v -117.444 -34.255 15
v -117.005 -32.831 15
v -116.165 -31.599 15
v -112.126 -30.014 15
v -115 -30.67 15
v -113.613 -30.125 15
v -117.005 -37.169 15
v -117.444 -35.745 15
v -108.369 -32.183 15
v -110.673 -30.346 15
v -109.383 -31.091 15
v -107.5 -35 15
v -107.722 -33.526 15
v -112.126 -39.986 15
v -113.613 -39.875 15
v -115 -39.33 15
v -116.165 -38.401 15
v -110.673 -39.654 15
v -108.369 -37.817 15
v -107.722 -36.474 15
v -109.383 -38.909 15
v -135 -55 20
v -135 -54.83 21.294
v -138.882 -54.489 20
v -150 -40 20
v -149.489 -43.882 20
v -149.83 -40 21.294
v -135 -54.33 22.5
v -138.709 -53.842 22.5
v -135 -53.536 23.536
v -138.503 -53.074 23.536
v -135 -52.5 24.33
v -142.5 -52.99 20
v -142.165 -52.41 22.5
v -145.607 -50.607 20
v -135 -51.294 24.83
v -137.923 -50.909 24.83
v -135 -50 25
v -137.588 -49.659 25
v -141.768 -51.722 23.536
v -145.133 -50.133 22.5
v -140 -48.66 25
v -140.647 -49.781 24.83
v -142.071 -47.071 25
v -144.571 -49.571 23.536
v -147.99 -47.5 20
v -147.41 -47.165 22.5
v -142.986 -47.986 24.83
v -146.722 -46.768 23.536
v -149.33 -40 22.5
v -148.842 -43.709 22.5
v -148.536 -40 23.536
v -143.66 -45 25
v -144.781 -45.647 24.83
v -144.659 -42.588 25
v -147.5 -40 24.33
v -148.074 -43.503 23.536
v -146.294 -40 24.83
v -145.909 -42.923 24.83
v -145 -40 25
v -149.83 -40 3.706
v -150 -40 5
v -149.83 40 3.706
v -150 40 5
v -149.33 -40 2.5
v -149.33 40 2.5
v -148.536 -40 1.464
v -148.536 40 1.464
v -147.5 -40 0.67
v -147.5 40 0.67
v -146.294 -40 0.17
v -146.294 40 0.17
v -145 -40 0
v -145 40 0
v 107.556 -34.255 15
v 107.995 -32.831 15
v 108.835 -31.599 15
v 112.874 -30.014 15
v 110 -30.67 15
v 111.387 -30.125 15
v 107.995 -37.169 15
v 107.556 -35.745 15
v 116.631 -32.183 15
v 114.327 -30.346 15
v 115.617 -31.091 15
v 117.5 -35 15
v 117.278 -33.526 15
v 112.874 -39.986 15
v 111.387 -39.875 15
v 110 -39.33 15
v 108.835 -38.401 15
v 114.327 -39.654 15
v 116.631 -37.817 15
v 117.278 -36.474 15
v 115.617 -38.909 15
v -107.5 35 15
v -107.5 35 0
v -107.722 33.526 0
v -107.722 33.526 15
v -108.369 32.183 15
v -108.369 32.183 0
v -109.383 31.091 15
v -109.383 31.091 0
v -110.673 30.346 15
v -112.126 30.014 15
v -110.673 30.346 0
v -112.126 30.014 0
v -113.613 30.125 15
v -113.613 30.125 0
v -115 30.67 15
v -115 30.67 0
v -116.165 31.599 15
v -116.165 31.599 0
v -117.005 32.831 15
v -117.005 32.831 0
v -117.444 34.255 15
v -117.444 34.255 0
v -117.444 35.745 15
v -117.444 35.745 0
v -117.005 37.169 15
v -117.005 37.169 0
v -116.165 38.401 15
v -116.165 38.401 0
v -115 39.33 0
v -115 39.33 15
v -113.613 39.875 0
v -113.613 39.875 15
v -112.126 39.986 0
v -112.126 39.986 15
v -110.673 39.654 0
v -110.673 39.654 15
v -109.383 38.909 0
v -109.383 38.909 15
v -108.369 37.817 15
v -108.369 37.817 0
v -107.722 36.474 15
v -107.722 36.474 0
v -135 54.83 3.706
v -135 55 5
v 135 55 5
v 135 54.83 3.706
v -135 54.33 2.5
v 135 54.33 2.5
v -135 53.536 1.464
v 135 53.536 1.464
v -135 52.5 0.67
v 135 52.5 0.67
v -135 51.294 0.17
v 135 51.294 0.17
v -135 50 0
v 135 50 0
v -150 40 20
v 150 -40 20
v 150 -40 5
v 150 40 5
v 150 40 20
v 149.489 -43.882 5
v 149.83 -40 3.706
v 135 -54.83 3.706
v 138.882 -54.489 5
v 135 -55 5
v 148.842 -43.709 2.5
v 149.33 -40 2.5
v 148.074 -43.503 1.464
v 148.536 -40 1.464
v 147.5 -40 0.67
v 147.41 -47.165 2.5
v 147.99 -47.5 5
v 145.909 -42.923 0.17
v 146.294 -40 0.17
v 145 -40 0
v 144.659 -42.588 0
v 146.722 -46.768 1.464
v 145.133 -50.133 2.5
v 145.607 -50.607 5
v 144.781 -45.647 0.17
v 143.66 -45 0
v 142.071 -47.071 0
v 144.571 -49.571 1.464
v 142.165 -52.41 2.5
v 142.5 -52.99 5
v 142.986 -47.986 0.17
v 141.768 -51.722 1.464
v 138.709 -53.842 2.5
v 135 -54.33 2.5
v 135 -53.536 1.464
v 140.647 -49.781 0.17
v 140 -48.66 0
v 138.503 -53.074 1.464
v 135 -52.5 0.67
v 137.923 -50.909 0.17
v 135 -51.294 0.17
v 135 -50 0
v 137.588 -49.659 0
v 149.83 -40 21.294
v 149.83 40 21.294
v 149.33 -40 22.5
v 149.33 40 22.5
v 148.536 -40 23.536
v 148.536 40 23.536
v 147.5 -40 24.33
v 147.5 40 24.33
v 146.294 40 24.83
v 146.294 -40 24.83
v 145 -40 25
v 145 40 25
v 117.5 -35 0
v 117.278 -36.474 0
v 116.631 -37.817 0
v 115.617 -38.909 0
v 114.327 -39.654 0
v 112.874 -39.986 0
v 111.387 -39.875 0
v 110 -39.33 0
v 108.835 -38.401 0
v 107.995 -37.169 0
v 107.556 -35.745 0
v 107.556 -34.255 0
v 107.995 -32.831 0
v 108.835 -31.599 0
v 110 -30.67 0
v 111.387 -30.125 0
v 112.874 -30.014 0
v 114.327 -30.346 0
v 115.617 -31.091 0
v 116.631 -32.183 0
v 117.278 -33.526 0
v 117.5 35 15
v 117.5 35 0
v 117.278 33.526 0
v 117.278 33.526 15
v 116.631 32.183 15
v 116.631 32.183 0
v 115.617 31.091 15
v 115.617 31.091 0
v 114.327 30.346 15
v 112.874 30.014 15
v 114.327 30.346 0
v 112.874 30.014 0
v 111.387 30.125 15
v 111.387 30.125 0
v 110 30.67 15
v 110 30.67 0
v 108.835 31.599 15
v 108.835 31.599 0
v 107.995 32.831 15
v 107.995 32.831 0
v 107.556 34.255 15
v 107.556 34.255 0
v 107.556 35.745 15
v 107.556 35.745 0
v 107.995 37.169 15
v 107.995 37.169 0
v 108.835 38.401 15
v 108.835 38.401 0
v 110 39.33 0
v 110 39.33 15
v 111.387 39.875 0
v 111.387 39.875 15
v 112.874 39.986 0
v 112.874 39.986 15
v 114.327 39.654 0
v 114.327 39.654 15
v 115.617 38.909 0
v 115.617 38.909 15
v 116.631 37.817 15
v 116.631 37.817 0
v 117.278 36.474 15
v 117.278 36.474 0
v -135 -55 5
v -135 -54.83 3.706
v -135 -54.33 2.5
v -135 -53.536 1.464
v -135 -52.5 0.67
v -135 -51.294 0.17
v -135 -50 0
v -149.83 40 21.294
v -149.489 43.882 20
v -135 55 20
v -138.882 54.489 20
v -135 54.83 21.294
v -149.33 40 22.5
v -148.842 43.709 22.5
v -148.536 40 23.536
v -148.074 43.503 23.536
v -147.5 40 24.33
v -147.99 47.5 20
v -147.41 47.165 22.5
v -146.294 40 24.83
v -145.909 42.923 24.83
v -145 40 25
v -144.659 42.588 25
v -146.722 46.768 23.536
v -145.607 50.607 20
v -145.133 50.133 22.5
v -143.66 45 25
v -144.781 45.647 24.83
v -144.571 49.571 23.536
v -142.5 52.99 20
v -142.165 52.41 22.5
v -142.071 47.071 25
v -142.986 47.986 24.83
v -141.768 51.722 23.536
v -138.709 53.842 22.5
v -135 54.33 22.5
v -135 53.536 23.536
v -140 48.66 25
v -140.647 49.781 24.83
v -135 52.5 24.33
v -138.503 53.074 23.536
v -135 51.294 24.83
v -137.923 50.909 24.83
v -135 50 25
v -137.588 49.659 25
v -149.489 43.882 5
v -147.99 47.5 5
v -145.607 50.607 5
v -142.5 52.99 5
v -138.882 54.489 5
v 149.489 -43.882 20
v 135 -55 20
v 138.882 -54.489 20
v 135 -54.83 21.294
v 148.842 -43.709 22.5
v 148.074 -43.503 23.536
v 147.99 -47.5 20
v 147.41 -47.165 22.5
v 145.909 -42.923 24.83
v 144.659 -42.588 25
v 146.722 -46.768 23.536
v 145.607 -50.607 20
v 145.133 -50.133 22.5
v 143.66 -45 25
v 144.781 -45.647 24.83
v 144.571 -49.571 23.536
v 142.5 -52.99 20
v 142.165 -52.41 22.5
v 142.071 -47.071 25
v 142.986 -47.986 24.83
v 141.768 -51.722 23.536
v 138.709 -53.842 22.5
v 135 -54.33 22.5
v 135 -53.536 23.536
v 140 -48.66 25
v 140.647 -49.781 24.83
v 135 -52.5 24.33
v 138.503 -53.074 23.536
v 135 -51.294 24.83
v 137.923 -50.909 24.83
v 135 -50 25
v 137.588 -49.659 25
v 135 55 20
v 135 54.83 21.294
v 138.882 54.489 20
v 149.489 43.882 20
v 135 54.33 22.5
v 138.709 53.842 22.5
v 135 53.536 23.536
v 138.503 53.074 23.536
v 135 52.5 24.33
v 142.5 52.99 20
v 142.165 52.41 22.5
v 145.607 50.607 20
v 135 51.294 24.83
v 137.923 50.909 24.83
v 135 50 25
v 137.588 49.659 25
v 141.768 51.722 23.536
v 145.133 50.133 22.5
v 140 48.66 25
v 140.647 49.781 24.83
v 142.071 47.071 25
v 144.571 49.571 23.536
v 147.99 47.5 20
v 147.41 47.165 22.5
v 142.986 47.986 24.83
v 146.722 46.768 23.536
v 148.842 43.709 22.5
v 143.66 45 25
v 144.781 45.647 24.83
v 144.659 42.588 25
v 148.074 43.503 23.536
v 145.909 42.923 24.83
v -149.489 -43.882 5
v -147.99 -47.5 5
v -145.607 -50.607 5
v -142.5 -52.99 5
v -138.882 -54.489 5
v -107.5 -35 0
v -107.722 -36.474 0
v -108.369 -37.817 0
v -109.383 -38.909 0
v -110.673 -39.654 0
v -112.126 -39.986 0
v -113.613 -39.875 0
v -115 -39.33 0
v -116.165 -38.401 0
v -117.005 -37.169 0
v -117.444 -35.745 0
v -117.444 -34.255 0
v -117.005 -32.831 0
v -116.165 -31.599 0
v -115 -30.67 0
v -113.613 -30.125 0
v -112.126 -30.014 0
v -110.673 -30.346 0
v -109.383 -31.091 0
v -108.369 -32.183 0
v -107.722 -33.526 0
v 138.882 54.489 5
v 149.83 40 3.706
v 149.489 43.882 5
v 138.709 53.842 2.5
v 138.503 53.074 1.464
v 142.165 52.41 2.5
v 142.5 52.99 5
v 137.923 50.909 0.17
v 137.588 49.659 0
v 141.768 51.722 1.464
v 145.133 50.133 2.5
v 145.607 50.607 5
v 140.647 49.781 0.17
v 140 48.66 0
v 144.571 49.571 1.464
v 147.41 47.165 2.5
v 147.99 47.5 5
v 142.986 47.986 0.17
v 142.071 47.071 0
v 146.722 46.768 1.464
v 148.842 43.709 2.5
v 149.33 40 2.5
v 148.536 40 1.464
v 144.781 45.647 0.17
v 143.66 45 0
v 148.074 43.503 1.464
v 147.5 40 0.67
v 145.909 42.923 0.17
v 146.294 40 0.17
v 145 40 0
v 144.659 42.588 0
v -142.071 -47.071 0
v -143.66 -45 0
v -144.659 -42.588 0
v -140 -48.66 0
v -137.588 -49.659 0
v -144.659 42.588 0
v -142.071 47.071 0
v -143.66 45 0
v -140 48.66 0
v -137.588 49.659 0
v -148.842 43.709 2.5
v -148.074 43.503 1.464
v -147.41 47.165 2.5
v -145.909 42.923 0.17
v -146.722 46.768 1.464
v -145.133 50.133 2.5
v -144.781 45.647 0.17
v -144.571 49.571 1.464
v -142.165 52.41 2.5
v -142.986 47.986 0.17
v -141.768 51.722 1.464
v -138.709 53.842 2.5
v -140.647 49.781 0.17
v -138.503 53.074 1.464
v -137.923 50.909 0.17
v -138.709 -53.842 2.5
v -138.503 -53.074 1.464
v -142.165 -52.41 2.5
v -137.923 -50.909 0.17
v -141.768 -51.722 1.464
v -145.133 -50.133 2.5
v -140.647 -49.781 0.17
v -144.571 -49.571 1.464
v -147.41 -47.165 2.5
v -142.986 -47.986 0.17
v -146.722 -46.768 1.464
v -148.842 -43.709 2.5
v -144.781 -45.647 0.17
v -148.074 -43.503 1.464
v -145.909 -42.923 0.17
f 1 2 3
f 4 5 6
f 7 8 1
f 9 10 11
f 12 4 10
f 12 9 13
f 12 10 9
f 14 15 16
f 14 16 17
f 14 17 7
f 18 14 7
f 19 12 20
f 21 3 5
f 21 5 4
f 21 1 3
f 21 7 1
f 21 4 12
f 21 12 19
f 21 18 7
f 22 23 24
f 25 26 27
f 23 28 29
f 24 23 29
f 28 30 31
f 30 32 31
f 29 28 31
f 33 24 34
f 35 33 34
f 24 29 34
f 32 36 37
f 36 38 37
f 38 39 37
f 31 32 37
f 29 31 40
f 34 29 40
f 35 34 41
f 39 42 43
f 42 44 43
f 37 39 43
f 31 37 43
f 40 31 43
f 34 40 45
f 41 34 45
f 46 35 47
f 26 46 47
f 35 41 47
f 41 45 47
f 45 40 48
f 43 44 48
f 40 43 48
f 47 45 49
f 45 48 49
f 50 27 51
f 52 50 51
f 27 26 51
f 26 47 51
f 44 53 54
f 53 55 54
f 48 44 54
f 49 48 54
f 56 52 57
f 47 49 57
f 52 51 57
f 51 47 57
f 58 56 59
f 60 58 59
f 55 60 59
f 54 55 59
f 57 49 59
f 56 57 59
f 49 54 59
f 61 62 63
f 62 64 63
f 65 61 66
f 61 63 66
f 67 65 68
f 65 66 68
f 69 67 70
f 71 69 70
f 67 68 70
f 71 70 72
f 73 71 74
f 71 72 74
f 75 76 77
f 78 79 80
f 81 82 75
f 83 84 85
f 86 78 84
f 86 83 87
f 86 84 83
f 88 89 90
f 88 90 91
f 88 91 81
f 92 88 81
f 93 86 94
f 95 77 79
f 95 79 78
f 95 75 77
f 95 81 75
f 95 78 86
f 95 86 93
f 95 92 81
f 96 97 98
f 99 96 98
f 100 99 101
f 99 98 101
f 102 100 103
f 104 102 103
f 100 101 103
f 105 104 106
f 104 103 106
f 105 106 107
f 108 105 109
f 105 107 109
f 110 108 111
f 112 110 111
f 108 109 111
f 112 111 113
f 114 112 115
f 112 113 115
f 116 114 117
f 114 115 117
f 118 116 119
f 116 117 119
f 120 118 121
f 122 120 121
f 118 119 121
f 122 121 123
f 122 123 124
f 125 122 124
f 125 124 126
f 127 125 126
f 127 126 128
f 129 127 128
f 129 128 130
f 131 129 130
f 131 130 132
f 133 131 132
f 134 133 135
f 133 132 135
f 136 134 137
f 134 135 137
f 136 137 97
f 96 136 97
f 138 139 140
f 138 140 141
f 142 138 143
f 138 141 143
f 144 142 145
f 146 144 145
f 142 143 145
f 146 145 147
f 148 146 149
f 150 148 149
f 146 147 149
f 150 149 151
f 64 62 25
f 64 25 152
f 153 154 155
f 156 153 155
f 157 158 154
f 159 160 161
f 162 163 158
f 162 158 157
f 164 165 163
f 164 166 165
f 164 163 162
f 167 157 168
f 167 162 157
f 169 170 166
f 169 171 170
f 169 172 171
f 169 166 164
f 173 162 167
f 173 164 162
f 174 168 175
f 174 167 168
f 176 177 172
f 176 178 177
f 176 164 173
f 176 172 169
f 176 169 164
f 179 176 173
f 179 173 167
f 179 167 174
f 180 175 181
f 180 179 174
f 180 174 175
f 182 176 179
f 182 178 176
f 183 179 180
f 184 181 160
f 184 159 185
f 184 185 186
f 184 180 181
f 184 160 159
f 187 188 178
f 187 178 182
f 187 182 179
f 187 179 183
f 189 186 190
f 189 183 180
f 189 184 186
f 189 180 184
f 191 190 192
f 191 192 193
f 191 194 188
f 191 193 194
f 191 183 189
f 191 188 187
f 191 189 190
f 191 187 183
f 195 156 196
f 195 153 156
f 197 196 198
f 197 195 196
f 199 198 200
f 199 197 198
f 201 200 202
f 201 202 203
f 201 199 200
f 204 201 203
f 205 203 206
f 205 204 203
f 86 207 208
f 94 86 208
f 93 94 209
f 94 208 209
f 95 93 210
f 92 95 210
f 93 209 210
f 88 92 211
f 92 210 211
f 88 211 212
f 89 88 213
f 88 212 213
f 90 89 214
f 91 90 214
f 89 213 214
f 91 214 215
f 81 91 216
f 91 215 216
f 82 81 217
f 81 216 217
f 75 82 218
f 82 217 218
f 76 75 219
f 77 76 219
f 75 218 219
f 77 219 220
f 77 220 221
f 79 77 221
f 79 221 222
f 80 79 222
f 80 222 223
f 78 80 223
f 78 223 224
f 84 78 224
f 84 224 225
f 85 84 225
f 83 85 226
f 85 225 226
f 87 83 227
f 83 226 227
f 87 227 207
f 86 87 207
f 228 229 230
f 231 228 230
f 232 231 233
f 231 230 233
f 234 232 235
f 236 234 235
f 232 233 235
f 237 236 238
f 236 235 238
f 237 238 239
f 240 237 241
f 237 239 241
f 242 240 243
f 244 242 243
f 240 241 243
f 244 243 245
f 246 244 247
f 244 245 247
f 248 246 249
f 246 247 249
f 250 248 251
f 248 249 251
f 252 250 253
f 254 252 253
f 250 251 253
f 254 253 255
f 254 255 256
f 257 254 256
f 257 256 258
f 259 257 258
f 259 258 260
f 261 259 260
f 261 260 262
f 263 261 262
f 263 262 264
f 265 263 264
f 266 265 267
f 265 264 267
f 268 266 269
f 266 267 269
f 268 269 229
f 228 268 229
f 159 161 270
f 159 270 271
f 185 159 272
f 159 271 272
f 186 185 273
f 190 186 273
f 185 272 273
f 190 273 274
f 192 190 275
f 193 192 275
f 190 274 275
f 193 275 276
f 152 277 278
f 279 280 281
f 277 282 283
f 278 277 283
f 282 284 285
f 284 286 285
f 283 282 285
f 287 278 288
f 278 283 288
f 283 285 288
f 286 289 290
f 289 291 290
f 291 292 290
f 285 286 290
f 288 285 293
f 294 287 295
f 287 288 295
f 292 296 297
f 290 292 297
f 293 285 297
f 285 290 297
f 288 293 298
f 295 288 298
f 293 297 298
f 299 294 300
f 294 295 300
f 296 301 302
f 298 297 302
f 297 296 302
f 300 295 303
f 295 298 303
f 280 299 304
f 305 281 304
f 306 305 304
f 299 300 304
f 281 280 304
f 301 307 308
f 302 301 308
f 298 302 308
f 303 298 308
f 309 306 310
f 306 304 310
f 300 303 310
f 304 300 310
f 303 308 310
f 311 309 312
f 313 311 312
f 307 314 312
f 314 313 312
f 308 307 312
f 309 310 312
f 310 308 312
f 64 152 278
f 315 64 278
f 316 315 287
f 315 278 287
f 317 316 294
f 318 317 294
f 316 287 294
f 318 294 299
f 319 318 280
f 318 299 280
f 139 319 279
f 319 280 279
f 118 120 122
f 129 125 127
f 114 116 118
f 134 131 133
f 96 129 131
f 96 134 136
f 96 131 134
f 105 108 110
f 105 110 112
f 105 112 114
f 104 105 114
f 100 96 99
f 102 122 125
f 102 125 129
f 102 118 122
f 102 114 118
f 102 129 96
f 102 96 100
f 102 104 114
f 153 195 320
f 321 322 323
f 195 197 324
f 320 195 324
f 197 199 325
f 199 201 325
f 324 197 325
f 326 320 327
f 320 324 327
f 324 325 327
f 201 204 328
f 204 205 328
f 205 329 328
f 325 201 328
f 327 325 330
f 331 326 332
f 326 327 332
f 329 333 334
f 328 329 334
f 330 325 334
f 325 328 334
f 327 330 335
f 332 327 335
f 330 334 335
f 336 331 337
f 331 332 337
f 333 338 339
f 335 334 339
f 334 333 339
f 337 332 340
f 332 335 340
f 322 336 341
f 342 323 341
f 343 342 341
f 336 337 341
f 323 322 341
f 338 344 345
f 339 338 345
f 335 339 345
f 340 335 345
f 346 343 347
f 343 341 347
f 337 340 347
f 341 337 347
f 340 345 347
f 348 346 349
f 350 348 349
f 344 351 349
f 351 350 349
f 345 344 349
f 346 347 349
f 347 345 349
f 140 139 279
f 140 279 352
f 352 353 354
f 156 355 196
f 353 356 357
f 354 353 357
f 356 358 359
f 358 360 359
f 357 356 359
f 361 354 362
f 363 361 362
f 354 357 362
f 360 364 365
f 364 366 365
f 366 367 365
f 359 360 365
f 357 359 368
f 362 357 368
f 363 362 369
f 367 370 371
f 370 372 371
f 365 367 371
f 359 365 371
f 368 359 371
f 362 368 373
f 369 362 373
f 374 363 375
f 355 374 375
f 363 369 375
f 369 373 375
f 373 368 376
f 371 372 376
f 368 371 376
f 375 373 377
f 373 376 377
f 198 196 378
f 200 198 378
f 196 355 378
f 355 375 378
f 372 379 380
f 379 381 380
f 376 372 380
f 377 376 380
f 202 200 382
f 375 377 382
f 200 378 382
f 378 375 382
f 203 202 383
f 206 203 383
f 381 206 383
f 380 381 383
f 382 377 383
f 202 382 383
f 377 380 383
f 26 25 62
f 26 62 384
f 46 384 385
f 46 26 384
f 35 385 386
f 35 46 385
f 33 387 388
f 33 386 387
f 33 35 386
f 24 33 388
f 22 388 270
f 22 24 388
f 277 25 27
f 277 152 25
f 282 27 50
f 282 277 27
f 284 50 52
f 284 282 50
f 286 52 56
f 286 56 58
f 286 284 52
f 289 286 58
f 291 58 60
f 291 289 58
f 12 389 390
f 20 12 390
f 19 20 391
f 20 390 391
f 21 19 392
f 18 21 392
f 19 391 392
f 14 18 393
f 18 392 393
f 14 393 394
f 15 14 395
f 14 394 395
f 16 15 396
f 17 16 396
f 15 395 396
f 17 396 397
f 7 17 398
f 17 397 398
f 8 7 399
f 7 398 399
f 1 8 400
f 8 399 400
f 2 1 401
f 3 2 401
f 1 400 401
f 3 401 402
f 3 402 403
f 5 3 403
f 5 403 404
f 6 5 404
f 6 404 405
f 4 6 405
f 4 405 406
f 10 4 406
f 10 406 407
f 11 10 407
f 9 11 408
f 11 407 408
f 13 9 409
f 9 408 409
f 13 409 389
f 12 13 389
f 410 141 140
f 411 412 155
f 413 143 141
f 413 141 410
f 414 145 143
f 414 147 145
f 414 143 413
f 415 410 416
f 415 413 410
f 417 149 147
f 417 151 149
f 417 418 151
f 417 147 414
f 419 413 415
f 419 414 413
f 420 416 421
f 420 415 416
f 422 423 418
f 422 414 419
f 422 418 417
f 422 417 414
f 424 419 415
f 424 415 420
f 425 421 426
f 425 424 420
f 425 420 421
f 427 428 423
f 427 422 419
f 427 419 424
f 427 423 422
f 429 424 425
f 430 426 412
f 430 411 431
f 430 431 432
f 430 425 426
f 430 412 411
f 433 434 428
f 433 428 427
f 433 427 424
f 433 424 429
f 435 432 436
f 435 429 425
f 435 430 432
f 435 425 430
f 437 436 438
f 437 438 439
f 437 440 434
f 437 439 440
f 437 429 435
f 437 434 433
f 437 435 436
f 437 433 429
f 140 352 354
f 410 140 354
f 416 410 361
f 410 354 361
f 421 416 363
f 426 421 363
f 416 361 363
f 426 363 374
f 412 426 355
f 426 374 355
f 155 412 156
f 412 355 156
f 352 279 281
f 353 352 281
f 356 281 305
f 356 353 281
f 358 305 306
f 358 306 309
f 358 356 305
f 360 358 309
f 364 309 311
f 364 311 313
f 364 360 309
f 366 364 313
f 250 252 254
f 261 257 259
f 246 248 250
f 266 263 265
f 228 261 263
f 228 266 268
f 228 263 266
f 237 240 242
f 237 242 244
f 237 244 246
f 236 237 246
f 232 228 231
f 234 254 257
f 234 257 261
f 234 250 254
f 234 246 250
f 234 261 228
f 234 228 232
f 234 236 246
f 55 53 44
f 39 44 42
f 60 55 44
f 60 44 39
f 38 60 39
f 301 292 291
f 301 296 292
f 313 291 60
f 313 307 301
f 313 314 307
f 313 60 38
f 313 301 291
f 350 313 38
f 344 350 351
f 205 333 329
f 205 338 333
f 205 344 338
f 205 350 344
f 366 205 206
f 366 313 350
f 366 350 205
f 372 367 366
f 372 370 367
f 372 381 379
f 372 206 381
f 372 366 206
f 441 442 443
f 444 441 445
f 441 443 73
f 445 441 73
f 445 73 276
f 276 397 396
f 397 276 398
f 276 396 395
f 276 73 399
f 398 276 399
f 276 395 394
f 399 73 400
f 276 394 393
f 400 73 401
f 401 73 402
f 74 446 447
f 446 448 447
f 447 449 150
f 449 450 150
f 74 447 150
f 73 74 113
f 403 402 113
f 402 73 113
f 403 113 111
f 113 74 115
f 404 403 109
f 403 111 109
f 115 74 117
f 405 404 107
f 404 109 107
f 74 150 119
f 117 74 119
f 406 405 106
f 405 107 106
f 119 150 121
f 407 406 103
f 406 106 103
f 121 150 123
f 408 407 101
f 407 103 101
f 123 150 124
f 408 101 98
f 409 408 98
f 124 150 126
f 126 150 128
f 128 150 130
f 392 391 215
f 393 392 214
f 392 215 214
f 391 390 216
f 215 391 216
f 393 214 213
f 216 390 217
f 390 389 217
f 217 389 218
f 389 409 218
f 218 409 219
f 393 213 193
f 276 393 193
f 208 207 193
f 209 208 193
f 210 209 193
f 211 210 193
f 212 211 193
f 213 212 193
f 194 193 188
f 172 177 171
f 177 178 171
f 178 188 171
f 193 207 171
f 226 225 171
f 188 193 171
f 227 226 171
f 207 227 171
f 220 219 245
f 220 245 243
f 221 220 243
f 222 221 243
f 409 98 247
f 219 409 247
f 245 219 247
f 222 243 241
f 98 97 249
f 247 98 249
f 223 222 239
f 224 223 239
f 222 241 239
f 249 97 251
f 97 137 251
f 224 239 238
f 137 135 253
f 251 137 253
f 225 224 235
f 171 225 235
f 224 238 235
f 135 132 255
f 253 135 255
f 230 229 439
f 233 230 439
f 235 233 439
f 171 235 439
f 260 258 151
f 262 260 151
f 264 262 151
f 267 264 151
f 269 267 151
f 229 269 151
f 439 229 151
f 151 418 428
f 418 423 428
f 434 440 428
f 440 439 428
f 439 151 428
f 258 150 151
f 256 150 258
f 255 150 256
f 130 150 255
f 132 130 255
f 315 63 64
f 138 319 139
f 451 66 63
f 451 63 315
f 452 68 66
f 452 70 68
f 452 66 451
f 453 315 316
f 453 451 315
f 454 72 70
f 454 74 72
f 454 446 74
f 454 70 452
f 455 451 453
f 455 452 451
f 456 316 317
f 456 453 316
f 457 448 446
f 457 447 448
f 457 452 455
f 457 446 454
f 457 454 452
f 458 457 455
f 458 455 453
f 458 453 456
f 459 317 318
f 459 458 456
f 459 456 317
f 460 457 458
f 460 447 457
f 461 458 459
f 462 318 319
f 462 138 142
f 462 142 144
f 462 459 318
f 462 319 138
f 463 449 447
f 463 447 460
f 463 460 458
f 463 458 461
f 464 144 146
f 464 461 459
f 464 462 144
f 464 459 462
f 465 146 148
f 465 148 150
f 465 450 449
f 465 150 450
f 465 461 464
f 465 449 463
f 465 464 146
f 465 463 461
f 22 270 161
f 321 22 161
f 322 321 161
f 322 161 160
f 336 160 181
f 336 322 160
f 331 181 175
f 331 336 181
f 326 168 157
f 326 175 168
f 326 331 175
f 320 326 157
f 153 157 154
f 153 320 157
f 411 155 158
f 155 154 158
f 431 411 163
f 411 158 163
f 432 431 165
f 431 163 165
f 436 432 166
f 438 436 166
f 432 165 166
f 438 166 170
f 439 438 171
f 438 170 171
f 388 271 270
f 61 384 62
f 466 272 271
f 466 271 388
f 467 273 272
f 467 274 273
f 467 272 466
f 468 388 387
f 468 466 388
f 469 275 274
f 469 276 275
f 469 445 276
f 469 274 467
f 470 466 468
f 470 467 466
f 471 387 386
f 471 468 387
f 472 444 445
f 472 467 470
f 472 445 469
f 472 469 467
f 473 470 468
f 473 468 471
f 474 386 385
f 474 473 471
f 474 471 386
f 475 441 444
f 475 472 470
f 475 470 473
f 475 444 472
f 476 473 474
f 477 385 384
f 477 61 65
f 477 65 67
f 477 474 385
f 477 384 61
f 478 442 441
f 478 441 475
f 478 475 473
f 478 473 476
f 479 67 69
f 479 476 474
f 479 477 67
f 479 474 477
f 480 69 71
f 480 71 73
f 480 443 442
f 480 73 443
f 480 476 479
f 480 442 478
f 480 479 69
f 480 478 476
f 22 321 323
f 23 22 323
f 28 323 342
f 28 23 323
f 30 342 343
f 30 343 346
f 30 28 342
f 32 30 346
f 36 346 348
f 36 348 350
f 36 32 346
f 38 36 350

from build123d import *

# Parameters (mm, degrees)
F0_W     = 300
F0_H     = 110
F1_DEPTH = 25
F2_R     = 5
F3_DEPTH = 15
F4_R     = 15
F5_R     = 5


with BuildPart() as f1:
    # F0 (on Top) → F1 (new body)
    with BuildSketch(Plane.XY):
        Rectangle(F0_W, F0_H)
    extrude(amount=F1_DEPTH)

    # F2 (on face) → F3 (cut)
    with BuildSketch(Plane(origin=(0, 0, 0), x_dir=(1, 0, 0), z_dir=(0, 0, -1))):
        with Locations((-112.5, 35)):
            Circle(F2_R)
        with Locations((112.5, 35)):
            Circle(F2_R)
        with Locations((112.5, -35)):
            Circle(F2_R)
        with Locations((-112.5, -35)):
            Circle(F2_R)
    extrude(amount=-F3_DEPTH, mode=Mode.SUBTRACT)

    # F4
    f4_edges = [f1.edges().sort_by_distance(p)[0] for p in [
        (-150, 55, 12.5),
        (-150, -55, 12.5),
        (150, -55, 12.5),
        (150, 55, 12.5),
    ]]
    fillet(f4_edges, radius=F4_R)

    # F5
    f5_edges = [f1.edges().sort_by_distance(p)[0] for p in [
        (-150, 0, 25),
        (-150, 0, 0),
    ]]
    fillet(f5_edges, radius=F5_R)


solid = f1.part
